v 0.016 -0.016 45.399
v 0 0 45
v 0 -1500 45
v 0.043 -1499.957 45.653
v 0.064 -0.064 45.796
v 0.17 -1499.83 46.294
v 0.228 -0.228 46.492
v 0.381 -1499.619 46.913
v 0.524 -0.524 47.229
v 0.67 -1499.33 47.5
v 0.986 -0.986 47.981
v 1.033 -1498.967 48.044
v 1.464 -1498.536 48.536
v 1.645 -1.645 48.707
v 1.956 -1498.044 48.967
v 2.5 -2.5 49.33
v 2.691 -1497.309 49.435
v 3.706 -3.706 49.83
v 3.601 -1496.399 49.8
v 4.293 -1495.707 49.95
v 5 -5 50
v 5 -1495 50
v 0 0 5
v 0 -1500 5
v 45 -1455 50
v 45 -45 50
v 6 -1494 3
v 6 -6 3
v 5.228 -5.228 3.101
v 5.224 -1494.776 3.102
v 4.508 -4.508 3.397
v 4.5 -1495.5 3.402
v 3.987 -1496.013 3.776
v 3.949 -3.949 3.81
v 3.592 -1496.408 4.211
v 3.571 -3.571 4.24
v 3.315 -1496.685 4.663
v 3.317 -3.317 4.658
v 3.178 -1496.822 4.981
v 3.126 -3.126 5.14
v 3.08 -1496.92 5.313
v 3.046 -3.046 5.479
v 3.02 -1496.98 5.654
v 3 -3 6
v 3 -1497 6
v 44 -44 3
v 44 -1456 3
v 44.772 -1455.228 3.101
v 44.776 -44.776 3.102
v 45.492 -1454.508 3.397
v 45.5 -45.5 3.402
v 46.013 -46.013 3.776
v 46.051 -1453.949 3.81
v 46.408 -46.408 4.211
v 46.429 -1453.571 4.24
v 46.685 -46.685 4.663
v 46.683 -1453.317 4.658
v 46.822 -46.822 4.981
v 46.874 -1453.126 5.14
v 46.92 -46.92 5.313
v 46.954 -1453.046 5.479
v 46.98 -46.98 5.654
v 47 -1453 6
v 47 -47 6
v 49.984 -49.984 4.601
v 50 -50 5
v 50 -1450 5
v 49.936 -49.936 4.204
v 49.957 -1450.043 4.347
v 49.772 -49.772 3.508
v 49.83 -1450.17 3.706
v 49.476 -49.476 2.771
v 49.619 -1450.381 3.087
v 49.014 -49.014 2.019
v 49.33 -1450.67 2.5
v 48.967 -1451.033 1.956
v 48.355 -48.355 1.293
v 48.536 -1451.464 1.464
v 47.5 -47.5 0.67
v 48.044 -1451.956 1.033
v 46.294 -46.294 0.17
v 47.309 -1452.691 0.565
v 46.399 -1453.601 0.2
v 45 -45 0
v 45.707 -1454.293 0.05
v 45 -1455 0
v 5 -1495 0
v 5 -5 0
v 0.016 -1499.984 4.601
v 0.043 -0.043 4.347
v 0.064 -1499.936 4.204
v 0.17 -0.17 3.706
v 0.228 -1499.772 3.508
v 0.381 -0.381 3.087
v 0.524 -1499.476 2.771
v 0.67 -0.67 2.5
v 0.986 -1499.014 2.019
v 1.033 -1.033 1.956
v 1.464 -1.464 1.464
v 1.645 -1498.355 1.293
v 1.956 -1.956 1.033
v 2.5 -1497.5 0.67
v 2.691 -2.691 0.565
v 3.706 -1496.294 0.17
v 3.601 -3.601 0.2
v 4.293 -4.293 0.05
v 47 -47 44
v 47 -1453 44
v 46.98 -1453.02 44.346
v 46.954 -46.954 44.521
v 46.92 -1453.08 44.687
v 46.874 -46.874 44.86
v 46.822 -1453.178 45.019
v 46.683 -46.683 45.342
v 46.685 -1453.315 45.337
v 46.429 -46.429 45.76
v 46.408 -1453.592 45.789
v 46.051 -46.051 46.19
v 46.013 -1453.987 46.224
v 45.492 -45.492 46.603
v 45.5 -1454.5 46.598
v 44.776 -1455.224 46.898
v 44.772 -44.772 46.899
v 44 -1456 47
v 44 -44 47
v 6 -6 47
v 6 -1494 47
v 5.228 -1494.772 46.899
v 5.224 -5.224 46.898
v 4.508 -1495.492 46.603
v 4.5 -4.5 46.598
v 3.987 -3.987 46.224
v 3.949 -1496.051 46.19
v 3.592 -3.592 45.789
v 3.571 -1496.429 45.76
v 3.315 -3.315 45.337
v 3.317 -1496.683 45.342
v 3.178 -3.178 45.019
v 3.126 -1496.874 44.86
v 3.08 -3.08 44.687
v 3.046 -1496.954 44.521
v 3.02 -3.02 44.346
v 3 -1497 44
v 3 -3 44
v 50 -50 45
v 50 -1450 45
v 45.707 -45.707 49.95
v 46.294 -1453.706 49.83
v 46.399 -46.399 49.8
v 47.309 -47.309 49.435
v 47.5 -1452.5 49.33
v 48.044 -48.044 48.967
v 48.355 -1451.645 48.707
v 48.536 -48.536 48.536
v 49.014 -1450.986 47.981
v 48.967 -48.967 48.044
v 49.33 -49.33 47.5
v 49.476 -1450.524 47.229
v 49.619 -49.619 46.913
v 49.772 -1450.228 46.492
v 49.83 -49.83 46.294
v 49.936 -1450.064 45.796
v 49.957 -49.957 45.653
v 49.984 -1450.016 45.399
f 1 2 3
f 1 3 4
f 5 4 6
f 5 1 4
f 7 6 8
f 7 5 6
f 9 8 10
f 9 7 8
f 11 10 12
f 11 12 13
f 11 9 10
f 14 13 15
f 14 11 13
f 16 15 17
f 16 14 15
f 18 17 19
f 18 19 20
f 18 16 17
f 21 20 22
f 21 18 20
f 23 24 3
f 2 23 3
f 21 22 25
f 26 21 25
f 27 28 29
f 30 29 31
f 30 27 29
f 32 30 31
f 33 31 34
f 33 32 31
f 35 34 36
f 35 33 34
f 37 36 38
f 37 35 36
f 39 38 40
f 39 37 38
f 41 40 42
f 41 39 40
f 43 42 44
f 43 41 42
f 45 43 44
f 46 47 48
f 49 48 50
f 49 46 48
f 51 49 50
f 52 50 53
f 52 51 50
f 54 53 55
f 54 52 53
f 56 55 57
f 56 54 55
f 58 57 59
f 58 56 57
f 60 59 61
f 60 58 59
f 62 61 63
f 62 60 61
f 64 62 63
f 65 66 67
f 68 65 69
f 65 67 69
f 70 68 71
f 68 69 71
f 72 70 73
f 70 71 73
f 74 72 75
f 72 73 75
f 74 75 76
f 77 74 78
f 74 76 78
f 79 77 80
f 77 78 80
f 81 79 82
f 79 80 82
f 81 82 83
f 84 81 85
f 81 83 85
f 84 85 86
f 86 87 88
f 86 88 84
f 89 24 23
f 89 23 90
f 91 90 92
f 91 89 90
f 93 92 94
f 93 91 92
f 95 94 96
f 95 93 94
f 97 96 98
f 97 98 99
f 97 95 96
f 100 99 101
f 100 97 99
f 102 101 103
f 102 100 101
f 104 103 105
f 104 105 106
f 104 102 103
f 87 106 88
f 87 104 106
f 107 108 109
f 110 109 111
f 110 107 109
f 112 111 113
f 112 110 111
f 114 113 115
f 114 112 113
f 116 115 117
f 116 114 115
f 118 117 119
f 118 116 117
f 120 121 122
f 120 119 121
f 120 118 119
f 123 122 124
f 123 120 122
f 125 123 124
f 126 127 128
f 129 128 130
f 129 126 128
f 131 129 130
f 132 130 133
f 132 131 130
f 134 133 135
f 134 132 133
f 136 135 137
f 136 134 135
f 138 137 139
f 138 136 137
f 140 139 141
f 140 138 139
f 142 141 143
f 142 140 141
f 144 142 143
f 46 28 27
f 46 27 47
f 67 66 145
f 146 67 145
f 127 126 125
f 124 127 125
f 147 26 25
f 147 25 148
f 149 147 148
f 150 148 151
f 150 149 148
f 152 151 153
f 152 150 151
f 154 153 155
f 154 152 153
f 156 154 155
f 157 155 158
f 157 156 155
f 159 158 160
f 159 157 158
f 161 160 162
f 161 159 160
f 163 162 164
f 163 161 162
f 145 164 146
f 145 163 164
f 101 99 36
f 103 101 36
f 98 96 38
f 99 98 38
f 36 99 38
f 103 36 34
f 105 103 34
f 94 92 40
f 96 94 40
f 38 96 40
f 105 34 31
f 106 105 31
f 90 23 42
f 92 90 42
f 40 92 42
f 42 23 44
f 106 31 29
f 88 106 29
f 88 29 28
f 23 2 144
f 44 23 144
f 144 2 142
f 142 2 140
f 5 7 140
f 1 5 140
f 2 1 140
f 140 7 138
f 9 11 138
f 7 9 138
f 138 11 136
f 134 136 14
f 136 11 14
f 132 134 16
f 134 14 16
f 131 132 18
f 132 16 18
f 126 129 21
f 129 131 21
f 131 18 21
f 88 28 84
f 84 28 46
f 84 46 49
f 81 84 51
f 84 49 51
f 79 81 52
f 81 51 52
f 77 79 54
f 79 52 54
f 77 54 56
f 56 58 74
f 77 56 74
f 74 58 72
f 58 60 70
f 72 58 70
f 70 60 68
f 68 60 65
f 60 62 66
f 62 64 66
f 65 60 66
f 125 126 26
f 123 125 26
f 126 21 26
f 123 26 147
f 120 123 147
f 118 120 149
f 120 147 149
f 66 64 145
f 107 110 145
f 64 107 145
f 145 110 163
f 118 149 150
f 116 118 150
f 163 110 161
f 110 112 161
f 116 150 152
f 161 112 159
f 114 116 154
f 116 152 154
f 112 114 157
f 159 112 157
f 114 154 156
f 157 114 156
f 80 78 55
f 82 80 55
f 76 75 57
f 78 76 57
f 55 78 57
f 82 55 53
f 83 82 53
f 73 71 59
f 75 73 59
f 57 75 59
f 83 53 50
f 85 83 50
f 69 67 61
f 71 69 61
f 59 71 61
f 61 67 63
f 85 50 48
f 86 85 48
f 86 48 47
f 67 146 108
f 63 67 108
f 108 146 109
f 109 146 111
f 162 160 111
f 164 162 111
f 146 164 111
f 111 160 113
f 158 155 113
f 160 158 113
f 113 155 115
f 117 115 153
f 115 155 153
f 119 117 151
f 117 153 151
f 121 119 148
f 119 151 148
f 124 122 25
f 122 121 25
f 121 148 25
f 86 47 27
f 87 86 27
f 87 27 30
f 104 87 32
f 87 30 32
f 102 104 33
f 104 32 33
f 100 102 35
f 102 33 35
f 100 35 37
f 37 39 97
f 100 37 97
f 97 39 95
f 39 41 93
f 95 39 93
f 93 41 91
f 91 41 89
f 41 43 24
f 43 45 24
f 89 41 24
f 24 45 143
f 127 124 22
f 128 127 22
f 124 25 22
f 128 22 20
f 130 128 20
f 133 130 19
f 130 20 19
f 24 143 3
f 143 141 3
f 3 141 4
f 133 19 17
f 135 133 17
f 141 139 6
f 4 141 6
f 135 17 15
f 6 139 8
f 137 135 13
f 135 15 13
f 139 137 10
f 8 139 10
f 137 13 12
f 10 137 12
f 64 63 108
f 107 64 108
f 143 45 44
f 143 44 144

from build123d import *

# Parameters (mm, degrees)
F0_W     = 50
F0_H     = 50
F0_W_2   = 44
F0_H_2   = 44
F1_DEPTH = 1500
F2_DEPTH = 100
F3_R     = 5
F4_R     = 3
F6_DEPTH = 50


with BuildPart() as f1:
    # F0 (on Front) → F1 (new body)
    with BuildSketch(Plane.XZ):
        with Locations((25, 25)):
            Rectangle(F0_W, F0_H)
        with Locations((25, 25)):
            Rectangle(F0_W_2, F0_H_2, mode=Mode.SUBTRACT)
    extrude(amount=F1_DEPTH)

    # F0 (on Front) → F2 (join)
    with BuildSketch(Plane.XZ):
        with Locations((25, 25)):
            Rectangle(F0_W, F0_H)
        with Locations((25, 25)):
            Rectangle(F0_W_2, F0_H_2, mode=Mode.SUBTRACT)
    extrude(amount=F2_DEPTH)

    # F3
    f3_edges = [f1.edges().sort_by_distance(p)[0] for p in [
        (50, -750, 50),
        (50, -750, 0),
        (0, -750, 0),
        (0, -750, 50),
    ]]
    fillet(f3_edges, radius=F3_R)

    # F4
    f4_edges = [f1.edges().sort_by_distance(p)[0] for p in [
        (47, -750, 47),
        (3, -750, 3),
        (3, -750, 47),
        (47, -750, 3),
    ]]
    fillet(f4_edges, radius=F4_R)

    # F5 (on face) → F6 (cut)
    with BuildSketch(Plane.XY.offset(50)):
        Polygon((50, 0), (0, 0), (50, -50), align=None)
        Polygon((50, -1450), (0, -1500), (50, -1500), align=None)
    extrude(amount=-F6_DEPTH, mode=Mode.SUBTRACT)


solid = f1.part
